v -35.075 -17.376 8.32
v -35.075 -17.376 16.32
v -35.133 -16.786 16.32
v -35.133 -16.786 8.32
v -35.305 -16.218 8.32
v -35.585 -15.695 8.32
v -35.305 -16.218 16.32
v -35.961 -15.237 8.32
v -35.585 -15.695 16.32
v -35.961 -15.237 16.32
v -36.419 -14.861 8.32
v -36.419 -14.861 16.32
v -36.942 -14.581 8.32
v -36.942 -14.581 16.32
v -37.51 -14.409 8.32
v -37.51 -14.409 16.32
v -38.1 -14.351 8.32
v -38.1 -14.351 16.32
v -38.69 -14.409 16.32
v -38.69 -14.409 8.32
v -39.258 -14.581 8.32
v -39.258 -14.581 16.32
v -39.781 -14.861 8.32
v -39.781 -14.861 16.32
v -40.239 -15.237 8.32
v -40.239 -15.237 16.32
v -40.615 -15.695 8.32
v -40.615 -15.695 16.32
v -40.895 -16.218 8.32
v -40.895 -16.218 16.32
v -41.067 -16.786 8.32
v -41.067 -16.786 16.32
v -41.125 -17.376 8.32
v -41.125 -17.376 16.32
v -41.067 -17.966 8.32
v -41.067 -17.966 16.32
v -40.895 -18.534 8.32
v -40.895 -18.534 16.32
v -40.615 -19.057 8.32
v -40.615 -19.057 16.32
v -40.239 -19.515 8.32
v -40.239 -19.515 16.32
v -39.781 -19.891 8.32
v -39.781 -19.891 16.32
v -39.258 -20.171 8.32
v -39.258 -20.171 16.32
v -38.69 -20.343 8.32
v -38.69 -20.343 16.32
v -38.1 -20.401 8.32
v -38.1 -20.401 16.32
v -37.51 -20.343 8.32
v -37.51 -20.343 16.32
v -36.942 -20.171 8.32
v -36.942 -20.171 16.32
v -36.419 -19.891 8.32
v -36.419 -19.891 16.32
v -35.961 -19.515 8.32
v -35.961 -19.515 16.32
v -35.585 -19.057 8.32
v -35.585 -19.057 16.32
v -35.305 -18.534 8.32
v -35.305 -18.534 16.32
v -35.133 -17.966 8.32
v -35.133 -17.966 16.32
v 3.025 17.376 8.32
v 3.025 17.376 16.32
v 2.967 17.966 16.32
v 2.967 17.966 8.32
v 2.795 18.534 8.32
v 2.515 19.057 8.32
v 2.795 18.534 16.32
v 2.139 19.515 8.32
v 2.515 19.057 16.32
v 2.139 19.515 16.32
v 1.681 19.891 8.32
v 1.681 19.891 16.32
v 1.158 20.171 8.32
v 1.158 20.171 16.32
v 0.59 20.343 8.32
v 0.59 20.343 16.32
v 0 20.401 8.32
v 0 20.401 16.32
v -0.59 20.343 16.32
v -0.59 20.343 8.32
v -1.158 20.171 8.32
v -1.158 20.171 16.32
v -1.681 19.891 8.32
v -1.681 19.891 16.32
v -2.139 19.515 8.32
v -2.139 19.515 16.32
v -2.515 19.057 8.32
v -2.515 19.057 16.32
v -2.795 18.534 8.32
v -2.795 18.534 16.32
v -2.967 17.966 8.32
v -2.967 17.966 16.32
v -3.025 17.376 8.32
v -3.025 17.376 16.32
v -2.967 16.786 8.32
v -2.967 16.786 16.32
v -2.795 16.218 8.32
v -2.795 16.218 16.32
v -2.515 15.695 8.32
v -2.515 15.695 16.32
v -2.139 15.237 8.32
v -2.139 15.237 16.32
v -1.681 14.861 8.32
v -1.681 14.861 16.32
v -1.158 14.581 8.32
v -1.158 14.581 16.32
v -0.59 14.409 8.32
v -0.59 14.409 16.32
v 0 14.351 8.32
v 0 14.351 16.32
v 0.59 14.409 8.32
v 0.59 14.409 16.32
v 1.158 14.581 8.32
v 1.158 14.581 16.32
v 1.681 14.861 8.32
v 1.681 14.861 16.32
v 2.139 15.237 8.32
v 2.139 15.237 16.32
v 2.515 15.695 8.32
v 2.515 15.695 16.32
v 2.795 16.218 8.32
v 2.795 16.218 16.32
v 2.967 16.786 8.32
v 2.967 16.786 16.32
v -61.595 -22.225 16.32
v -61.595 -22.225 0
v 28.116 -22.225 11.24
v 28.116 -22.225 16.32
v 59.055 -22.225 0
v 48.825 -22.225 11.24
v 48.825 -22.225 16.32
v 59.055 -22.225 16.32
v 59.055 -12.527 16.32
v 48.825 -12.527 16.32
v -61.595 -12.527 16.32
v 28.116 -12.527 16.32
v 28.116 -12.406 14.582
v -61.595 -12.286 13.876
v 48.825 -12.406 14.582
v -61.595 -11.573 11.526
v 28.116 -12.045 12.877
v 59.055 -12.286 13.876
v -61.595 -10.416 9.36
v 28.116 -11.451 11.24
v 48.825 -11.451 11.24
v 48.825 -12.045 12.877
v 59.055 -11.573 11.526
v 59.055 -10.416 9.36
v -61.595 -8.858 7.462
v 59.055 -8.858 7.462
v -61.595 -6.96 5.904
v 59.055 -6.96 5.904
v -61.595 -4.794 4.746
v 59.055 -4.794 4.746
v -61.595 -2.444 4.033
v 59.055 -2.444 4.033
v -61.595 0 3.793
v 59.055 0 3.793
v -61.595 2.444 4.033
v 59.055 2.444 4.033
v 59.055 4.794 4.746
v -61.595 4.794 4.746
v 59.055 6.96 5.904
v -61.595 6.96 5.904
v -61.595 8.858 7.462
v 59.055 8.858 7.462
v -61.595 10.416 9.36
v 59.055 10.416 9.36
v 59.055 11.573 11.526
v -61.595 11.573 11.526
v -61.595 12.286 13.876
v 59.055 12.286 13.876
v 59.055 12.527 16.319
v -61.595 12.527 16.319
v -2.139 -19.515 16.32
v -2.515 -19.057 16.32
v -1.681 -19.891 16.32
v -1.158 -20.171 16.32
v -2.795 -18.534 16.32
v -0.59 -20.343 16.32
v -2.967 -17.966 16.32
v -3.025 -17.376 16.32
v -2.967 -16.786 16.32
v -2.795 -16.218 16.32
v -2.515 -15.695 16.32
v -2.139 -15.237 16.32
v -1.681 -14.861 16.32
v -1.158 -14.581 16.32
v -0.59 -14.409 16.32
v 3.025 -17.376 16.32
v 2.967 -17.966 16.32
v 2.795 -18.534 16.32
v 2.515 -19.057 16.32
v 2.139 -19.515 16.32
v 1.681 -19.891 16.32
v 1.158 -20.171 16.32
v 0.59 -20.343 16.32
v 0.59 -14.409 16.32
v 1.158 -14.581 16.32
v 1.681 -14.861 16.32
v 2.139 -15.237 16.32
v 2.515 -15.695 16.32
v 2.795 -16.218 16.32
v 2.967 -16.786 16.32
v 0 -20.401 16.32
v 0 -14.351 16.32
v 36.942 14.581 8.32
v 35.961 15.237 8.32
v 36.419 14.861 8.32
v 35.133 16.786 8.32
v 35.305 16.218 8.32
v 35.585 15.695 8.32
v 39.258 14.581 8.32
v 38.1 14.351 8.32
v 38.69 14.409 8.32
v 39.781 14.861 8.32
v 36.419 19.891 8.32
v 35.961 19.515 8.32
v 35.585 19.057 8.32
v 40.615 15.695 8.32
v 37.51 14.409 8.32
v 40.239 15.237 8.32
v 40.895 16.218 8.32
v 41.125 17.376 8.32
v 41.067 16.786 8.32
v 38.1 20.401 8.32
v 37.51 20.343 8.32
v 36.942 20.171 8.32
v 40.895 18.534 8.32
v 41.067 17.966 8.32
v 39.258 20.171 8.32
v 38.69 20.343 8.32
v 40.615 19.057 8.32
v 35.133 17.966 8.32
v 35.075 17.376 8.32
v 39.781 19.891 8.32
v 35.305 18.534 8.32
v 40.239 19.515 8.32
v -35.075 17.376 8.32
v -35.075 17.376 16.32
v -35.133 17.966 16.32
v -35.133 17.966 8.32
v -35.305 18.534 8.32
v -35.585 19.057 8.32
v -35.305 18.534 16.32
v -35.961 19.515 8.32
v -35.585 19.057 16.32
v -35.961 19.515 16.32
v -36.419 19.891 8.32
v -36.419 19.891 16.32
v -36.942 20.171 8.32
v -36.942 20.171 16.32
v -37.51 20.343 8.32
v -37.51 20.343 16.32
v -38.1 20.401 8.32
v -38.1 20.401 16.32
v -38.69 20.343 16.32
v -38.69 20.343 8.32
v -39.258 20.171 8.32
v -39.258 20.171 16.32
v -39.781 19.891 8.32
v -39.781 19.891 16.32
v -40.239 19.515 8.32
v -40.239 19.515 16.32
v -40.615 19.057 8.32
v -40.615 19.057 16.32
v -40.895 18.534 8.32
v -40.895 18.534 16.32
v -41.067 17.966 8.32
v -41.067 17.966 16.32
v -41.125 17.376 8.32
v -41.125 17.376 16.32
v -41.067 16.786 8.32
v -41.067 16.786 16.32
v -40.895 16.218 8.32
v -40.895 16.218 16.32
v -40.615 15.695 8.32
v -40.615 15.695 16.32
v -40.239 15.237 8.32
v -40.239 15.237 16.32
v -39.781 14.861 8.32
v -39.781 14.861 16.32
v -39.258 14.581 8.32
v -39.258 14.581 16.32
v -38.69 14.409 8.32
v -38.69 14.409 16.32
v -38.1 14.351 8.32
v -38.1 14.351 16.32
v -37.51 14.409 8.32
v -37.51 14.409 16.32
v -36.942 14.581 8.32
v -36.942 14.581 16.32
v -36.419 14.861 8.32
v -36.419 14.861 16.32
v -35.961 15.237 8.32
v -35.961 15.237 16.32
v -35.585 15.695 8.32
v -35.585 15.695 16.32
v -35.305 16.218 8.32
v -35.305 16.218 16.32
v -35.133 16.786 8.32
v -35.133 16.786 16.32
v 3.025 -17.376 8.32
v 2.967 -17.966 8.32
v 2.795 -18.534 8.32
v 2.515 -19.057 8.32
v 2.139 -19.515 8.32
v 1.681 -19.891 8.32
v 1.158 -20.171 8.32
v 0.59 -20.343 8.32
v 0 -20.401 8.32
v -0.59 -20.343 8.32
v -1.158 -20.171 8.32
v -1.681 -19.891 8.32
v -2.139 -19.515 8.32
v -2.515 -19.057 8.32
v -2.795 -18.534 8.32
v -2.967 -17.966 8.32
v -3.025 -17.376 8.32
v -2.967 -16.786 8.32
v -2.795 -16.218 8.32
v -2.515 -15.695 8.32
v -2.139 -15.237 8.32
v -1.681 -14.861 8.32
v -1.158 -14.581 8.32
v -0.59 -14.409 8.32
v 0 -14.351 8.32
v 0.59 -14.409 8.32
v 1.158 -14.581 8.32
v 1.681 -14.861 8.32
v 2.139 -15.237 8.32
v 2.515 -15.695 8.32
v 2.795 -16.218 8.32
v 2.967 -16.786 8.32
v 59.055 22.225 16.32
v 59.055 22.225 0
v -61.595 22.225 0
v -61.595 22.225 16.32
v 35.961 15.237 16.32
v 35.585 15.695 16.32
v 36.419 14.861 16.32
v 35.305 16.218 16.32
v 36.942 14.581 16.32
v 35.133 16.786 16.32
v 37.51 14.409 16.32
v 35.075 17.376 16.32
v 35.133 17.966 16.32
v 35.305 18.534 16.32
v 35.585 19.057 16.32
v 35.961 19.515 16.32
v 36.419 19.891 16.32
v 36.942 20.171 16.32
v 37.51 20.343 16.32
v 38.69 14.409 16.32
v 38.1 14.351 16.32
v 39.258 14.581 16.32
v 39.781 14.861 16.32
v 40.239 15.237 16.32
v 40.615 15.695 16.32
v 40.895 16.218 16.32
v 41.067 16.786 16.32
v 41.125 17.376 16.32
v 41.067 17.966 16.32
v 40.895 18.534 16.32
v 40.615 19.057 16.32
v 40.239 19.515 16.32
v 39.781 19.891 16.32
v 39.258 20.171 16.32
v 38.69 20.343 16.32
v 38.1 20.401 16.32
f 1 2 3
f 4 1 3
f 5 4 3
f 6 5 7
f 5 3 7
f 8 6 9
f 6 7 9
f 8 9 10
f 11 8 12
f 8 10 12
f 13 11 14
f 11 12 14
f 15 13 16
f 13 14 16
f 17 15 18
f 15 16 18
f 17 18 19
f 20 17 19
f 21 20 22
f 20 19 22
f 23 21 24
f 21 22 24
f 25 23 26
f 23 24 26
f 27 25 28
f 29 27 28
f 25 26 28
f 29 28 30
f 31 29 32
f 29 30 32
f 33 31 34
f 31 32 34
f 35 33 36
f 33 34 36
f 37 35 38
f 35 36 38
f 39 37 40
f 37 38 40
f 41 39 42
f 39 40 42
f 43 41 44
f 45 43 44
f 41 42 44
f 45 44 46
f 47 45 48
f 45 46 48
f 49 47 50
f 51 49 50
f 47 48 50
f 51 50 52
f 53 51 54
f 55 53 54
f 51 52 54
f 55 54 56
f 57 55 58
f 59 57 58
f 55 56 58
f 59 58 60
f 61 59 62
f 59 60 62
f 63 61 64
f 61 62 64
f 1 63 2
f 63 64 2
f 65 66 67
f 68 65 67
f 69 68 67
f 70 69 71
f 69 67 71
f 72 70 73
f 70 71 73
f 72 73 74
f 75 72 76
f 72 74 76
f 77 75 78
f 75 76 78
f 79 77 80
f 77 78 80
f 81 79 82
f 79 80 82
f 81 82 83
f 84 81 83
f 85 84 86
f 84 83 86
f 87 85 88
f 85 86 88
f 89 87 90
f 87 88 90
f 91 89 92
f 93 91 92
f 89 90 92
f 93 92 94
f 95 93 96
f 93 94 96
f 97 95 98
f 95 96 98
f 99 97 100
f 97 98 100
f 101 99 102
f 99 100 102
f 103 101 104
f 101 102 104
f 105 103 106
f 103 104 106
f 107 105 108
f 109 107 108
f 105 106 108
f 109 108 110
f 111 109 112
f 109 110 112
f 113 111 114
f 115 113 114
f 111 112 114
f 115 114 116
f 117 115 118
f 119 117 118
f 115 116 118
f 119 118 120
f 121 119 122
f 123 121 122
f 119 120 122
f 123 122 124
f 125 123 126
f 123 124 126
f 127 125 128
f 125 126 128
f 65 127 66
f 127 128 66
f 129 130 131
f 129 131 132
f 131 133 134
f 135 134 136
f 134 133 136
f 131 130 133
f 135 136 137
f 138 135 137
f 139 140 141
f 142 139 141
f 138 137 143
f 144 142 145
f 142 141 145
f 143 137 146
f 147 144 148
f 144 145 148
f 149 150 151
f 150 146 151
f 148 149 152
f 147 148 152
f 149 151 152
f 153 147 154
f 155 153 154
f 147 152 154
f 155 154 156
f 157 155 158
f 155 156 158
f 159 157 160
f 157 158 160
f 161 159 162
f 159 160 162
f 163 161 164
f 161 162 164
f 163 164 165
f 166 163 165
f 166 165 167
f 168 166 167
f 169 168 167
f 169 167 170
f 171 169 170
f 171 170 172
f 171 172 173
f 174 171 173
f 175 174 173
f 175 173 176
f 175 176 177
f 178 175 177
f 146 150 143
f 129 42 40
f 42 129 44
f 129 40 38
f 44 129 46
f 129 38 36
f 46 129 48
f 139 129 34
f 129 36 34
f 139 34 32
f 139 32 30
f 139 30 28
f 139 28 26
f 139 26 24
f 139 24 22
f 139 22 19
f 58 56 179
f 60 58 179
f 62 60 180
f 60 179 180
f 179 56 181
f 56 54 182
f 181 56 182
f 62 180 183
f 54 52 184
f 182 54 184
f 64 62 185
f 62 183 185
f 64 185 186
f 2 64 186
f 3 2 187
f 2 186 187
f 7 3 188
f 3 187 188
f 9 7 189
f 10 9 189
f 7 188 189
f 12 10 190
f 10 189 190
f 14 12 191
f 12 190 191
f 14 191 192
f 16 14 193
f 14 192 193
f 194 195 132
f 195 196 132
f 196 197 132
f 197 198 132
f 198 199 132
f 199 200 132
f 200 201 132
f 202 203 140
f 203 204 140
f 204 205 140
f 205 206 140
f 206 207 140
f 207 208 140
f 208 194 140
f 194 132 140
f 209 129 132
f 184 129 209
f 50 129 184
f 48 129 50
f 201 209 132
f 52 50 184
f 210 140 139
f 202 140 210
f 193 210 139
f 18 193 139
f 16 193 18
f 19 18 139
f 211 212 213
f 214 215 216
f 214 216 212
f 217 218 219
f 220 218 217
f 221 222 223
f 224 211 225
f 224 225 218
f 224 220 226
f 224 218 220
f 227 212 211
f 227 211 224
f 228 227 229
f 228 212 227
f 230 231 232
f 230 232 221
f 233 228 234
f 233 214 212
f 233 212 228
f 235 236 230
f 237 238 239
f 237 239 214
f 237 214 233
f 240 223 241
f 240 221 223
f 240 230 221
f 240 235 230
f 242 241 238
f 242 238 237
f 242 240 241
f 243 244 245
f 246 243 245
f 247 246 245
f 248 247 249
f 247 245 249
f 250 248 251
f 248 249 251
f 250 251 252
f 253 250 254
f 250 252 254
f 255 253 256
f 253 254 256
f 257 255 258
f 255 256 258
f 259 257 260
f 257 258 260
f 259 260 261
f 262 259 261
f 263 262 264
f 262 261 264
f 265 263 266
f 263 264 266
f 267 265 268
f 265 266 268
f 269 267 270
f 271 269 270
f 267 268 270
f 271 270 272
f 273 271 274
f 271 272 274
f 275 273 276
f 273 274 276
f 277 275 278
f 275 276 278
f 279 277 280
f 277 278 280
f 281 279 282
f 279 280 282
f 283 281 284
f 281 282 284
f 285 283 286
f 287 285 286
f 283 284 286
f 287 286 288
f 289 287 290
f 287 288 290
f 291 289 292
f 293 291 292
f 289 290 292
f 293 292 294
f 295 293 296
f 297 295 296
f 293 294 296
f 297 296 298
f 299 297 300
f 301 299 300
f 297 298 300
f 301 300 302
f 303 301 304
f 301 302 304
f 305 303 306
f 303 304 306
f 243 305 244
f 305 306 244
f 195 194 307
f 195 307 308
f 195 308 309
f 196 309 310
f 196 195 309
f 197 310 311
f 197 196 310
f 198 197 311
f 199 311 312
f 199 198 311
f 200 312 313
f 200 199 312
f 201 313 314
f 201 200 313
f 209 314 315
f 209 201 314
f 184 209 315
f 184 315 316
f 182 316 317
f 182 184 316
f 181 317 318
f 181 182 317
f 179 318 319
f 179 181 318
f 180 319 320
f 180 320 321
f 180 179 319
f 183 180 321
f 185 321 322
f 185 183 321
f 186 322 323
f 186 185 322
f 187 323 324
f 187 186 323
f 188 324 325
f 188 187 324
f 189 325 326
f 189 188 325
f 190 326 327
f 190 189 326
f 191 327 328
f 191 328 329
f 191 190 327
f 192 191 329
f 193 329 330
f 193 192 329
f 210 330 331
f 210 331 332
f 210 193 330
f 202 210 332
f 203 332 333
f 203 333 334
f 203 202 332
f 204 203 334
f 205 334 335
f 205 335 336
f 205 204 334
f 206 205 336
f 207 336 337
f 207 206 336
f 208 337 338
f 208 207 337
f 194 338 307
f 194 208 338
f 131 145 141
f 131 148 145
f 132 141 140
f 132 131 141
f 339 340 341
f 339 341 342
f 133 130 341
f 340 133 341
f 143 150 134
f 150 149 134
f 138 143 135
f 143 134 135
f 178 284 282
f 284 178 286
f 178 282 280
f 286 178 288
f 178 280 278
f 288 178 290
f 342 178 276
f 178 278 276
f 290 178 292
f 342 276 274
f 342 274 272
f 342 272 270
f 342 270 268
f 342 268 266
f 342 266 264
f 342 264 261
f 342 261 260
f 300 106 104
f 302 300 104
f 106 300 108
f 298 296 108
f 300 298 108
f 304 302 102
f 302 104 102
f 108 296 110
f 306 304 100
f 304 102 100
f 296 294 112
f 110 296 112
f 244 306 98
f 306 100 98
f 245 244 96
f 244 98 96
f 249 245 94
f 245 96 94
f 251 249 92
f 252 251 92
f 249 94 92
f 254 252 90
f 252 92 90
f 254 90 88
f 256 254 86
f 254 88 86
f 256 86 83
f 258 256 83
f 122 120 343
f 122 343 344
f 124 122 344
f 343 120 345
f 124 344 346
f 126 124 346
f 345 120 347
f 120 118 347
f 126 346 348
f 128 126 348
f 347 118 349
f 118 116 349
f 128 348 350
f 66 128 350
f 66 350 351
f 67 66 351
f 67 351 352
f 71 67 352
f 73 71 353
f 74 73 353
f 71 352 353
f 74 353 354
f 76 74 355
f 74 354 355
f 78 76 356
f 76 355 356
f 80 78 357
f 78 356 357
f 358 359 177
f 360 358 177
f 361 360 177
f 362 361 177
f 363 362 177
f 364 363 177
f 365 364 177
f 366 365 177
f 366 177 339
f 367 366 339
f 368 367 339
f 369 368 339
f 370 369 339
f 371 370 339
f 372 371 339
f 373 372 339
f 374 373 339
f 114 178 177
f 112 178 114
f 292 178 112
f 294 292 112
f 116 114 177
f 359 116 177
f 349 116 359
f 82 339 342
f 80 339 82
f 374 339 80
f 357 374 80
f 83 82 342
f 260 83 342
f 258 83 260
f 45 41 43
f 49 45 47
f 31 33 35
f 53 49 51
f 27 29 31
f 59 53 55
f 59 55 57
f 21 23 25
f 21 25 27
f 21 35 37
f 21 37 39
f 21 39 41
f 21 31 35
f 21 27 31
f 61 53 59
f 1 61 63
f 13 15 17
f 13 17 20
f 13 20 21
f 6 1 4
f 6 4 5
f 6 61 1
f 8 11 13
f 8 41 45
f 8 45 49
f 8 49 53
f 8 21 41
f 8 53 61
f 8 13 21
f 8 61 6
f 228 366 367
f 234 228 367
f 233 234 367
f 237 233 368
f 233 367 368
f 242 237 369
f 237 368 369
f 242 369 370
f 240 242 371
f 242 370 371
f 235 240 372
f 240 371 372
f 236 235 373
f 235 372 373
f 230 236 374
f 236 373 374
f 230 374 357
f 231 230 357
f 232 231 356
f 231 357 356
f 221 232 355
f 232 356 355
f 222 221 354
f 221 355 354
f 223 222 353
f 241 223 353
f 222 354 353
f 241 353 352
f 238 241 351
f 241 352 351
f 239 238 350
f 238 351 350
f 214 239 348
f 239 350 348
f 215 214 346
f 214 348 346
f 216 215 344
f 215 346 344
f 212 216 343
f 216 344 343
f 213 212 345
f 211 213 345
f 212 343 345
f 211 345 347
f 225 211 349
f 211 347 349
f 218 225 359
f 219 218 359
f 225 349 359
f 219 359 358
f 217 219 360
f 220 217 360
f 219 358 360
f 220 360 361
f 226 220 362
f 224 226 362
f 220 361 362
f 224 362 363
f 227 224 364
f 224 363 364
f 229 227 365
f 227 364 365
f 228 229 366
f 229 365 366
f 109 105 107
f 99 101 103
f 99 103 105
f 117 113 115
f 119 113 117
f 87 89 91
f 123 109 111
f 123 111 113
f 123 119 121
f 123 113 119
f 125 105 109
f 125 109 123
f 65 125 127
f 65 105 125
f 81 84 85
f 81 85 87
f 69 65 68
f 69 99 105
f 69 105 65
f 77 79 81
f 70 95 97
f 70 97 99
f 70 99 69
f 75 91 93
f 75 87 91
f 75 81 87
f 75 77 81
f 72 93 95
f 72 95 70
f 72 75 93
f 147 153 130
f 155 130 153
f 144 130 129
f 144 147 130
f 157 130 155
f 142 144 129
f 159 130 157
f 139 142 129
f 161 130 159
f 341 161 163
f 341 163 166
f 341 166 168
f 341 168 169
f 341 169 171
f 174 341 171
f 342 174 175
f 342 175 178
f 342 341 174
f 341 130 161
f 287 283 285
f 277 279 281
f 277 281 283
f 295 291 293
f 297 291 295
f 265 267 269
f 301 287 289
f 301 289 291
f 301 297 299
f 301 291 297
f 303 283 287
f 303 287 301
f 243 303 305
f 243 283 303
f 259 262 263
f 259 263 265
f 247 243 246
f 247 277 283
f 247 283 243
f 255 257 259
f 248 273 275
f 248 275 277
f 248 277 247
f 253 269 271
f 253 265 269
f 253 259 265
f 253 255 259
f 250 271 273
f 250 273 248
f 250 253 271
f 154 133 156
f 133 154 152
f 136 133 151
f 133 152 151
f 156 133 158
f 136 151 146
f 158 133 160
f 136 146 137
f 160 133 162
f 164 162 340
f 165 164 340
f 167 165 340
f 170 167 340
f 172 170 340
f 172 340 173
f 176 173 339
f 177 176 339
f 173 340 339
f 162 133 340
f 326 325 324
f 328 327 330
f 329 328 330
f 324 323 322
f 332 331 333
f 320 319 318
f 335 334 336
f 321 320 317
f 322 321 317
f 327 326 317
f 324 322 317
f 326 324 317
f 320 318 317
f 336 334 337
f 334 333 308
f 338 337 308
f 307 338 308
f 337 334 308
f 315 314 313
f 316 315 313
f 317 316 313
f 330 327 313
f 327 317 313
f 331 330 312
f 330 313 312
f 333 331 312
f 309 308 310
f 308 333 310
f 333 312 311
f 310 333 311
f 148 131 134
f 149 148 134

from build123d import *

# Parameters (mm, degrees)
SKETCH1_W                = 118.11
SKETCH1_H                = 44.45
BOSS_EXTRUDE1_DEPTH      = 2
BOSS_EXTRUDE2_DEPTH      = 2.54
BOSS_EXTRUDE2_DEPTH_BACK = 118.11
SKETCH3_R                = 3.025
CUT_EXTRUDE1_DEPTH       = 8
SKETCH11_W               = 20.708368279
SKETCH11_H               = 9.6981
CUT_EXTRUDE4_DEPTH       = 5.08
SKETCH12_W               = 20.708368279
SKETCH12_H               = 5.08
CUT_EXTRUDE5_DEPTH       = 2.54
LPATTERN1_COUNT          = 2
LPATTERN1_PITCH          = 38.1
MIRROR1_COPY_1_SKETCH_R  = 3.025
MIRROR1_COPY_1_DEPTH     = 8
LPATTERN2_COUNT          = 2
LPATTERN2_PITCH          = 38.1
SKETCH16_W               = 2
SKETCH16_H               = 44.45
BOSS_EXTRUDE5_DEPTH      = 2.54


with BuildPart() as part:
    # Sketch1 → Boss-Extrude1 (new body)
    with BuildSketch(Plane.XY):
        Rectangle(SKETCH1_W, SKETCH1_H)
    extrude(amount=BOSS_EXTRUDE1_DEPTH)

    # Sketch2 → Boss-Extrude2 (add, two sides: drawn at the far end of the back side and taken through both)
    with BuildSketch(Plane.ZY.offset(59.055).offset(-BOSS_EXTRUDE2_DEPTH_BACK)):
        with BuildLine():
            Line((16.3195, 22.225), (2, 22.225))
            Line((2, 22.225), (2, -22.225))
            Line((2, -22.225), (16.3195, -22.225))
            Line((16.3195, -22.225), (16.3195, -12.5269))
            ThreePointArc((16.3195, -12.5269), (3.7926, 0), (16.3195, 12.5269))
            Line((16.3195, 12.5269), (16.3195, 22.225))
        make_face()
    extrude(amount=BOSS_EXTRUDE2_DEPTH + BOSS_EXTRUDE2_DEPTH_BACK)

    # Sketch3 → Cut-Extrude1 (cut)
    with BuildSketch(Plane.XY.offset(16.3195)):
        with Locations((0, 17.37595)):
            Circle(SKETCH3_R)
    cut_extrude1 = extrude(amount=-CUT_EXTRUDE1_DEPTH, mode=Mode.SUBTRACT)

    # Sketch11 → Cut-Extrude4 (cut)
    with BuildSketch(Plane.XY.offset(16.3195)):
        with Locations((38.470435787, -17.37595)):
            Rectangle(SKETCH11_W, SKETCH11_H)
    extrude(amount=-CUT_EXTRUDE4_DEPTH, mode=Mode.SUBTRACT)

    # Sketch12 → Cut-Extrude5 (cut)
    with BuildSketch(Plane.XZ.offset(12.5269)):
        with Locations((38.470435787, 13.7795)):
            Rectangle(SKETCH12_W, SKETCH12_H)
    extrude(amount=-CUT_EXTRUDE5_DEPTH, mode=Mode.SUBTRACT)

    # LPattern1: Cut-Extrude1 ×2
    with Locations(*[(-i * LPATTERN1_PITCH, 0, 0) for i in range(1, LPATTERN1_COUNT)]):
        add(cut_extrude1, mode=Mode.SUBTRACT)

    # Mirror1: Cut-Extrude1 across plane
    add(cut_extrude1.mirror(Plane.ZX), mode=Mode.SUBTRACT)

    # Mirror1 copy 1 sketch → Mirror1 copy 1 (cut)
    with BuildSketch(Plane(origin=(-38.1, 0, 16.3195), x_dir=(1, 0, 0), z_dir=(0, 0, 1))):
        with Locations((0, -17.37595)):
            Circle(MIRROR1_COPY_1_SKETCH_R)
    extrude(amount=-MIRROR1_COPY_1_DEPTH, mode=Mode.SUBTRACT)

    # LPattern2: Cut-Extrude1 ×2
    with Locations(*[(i * LPATTERN2_PITCH, 0, 0) for i in range(1, LPATTERN2_COUNT)]):
        add(cut_extrude1, mode=Mode.SUBTRACT)

    # Sketch16 → Boss-Extrude5 (add)
    with BuildSketch(Plane.ZY.offset(59.055)):
        with Locations((1, 0)):
            Rectangle(SKETCH16_W, SKETCH16_H)
    extrude(amount=BOSS_EXTRUDE5_DEPTH)


solid = part.part
